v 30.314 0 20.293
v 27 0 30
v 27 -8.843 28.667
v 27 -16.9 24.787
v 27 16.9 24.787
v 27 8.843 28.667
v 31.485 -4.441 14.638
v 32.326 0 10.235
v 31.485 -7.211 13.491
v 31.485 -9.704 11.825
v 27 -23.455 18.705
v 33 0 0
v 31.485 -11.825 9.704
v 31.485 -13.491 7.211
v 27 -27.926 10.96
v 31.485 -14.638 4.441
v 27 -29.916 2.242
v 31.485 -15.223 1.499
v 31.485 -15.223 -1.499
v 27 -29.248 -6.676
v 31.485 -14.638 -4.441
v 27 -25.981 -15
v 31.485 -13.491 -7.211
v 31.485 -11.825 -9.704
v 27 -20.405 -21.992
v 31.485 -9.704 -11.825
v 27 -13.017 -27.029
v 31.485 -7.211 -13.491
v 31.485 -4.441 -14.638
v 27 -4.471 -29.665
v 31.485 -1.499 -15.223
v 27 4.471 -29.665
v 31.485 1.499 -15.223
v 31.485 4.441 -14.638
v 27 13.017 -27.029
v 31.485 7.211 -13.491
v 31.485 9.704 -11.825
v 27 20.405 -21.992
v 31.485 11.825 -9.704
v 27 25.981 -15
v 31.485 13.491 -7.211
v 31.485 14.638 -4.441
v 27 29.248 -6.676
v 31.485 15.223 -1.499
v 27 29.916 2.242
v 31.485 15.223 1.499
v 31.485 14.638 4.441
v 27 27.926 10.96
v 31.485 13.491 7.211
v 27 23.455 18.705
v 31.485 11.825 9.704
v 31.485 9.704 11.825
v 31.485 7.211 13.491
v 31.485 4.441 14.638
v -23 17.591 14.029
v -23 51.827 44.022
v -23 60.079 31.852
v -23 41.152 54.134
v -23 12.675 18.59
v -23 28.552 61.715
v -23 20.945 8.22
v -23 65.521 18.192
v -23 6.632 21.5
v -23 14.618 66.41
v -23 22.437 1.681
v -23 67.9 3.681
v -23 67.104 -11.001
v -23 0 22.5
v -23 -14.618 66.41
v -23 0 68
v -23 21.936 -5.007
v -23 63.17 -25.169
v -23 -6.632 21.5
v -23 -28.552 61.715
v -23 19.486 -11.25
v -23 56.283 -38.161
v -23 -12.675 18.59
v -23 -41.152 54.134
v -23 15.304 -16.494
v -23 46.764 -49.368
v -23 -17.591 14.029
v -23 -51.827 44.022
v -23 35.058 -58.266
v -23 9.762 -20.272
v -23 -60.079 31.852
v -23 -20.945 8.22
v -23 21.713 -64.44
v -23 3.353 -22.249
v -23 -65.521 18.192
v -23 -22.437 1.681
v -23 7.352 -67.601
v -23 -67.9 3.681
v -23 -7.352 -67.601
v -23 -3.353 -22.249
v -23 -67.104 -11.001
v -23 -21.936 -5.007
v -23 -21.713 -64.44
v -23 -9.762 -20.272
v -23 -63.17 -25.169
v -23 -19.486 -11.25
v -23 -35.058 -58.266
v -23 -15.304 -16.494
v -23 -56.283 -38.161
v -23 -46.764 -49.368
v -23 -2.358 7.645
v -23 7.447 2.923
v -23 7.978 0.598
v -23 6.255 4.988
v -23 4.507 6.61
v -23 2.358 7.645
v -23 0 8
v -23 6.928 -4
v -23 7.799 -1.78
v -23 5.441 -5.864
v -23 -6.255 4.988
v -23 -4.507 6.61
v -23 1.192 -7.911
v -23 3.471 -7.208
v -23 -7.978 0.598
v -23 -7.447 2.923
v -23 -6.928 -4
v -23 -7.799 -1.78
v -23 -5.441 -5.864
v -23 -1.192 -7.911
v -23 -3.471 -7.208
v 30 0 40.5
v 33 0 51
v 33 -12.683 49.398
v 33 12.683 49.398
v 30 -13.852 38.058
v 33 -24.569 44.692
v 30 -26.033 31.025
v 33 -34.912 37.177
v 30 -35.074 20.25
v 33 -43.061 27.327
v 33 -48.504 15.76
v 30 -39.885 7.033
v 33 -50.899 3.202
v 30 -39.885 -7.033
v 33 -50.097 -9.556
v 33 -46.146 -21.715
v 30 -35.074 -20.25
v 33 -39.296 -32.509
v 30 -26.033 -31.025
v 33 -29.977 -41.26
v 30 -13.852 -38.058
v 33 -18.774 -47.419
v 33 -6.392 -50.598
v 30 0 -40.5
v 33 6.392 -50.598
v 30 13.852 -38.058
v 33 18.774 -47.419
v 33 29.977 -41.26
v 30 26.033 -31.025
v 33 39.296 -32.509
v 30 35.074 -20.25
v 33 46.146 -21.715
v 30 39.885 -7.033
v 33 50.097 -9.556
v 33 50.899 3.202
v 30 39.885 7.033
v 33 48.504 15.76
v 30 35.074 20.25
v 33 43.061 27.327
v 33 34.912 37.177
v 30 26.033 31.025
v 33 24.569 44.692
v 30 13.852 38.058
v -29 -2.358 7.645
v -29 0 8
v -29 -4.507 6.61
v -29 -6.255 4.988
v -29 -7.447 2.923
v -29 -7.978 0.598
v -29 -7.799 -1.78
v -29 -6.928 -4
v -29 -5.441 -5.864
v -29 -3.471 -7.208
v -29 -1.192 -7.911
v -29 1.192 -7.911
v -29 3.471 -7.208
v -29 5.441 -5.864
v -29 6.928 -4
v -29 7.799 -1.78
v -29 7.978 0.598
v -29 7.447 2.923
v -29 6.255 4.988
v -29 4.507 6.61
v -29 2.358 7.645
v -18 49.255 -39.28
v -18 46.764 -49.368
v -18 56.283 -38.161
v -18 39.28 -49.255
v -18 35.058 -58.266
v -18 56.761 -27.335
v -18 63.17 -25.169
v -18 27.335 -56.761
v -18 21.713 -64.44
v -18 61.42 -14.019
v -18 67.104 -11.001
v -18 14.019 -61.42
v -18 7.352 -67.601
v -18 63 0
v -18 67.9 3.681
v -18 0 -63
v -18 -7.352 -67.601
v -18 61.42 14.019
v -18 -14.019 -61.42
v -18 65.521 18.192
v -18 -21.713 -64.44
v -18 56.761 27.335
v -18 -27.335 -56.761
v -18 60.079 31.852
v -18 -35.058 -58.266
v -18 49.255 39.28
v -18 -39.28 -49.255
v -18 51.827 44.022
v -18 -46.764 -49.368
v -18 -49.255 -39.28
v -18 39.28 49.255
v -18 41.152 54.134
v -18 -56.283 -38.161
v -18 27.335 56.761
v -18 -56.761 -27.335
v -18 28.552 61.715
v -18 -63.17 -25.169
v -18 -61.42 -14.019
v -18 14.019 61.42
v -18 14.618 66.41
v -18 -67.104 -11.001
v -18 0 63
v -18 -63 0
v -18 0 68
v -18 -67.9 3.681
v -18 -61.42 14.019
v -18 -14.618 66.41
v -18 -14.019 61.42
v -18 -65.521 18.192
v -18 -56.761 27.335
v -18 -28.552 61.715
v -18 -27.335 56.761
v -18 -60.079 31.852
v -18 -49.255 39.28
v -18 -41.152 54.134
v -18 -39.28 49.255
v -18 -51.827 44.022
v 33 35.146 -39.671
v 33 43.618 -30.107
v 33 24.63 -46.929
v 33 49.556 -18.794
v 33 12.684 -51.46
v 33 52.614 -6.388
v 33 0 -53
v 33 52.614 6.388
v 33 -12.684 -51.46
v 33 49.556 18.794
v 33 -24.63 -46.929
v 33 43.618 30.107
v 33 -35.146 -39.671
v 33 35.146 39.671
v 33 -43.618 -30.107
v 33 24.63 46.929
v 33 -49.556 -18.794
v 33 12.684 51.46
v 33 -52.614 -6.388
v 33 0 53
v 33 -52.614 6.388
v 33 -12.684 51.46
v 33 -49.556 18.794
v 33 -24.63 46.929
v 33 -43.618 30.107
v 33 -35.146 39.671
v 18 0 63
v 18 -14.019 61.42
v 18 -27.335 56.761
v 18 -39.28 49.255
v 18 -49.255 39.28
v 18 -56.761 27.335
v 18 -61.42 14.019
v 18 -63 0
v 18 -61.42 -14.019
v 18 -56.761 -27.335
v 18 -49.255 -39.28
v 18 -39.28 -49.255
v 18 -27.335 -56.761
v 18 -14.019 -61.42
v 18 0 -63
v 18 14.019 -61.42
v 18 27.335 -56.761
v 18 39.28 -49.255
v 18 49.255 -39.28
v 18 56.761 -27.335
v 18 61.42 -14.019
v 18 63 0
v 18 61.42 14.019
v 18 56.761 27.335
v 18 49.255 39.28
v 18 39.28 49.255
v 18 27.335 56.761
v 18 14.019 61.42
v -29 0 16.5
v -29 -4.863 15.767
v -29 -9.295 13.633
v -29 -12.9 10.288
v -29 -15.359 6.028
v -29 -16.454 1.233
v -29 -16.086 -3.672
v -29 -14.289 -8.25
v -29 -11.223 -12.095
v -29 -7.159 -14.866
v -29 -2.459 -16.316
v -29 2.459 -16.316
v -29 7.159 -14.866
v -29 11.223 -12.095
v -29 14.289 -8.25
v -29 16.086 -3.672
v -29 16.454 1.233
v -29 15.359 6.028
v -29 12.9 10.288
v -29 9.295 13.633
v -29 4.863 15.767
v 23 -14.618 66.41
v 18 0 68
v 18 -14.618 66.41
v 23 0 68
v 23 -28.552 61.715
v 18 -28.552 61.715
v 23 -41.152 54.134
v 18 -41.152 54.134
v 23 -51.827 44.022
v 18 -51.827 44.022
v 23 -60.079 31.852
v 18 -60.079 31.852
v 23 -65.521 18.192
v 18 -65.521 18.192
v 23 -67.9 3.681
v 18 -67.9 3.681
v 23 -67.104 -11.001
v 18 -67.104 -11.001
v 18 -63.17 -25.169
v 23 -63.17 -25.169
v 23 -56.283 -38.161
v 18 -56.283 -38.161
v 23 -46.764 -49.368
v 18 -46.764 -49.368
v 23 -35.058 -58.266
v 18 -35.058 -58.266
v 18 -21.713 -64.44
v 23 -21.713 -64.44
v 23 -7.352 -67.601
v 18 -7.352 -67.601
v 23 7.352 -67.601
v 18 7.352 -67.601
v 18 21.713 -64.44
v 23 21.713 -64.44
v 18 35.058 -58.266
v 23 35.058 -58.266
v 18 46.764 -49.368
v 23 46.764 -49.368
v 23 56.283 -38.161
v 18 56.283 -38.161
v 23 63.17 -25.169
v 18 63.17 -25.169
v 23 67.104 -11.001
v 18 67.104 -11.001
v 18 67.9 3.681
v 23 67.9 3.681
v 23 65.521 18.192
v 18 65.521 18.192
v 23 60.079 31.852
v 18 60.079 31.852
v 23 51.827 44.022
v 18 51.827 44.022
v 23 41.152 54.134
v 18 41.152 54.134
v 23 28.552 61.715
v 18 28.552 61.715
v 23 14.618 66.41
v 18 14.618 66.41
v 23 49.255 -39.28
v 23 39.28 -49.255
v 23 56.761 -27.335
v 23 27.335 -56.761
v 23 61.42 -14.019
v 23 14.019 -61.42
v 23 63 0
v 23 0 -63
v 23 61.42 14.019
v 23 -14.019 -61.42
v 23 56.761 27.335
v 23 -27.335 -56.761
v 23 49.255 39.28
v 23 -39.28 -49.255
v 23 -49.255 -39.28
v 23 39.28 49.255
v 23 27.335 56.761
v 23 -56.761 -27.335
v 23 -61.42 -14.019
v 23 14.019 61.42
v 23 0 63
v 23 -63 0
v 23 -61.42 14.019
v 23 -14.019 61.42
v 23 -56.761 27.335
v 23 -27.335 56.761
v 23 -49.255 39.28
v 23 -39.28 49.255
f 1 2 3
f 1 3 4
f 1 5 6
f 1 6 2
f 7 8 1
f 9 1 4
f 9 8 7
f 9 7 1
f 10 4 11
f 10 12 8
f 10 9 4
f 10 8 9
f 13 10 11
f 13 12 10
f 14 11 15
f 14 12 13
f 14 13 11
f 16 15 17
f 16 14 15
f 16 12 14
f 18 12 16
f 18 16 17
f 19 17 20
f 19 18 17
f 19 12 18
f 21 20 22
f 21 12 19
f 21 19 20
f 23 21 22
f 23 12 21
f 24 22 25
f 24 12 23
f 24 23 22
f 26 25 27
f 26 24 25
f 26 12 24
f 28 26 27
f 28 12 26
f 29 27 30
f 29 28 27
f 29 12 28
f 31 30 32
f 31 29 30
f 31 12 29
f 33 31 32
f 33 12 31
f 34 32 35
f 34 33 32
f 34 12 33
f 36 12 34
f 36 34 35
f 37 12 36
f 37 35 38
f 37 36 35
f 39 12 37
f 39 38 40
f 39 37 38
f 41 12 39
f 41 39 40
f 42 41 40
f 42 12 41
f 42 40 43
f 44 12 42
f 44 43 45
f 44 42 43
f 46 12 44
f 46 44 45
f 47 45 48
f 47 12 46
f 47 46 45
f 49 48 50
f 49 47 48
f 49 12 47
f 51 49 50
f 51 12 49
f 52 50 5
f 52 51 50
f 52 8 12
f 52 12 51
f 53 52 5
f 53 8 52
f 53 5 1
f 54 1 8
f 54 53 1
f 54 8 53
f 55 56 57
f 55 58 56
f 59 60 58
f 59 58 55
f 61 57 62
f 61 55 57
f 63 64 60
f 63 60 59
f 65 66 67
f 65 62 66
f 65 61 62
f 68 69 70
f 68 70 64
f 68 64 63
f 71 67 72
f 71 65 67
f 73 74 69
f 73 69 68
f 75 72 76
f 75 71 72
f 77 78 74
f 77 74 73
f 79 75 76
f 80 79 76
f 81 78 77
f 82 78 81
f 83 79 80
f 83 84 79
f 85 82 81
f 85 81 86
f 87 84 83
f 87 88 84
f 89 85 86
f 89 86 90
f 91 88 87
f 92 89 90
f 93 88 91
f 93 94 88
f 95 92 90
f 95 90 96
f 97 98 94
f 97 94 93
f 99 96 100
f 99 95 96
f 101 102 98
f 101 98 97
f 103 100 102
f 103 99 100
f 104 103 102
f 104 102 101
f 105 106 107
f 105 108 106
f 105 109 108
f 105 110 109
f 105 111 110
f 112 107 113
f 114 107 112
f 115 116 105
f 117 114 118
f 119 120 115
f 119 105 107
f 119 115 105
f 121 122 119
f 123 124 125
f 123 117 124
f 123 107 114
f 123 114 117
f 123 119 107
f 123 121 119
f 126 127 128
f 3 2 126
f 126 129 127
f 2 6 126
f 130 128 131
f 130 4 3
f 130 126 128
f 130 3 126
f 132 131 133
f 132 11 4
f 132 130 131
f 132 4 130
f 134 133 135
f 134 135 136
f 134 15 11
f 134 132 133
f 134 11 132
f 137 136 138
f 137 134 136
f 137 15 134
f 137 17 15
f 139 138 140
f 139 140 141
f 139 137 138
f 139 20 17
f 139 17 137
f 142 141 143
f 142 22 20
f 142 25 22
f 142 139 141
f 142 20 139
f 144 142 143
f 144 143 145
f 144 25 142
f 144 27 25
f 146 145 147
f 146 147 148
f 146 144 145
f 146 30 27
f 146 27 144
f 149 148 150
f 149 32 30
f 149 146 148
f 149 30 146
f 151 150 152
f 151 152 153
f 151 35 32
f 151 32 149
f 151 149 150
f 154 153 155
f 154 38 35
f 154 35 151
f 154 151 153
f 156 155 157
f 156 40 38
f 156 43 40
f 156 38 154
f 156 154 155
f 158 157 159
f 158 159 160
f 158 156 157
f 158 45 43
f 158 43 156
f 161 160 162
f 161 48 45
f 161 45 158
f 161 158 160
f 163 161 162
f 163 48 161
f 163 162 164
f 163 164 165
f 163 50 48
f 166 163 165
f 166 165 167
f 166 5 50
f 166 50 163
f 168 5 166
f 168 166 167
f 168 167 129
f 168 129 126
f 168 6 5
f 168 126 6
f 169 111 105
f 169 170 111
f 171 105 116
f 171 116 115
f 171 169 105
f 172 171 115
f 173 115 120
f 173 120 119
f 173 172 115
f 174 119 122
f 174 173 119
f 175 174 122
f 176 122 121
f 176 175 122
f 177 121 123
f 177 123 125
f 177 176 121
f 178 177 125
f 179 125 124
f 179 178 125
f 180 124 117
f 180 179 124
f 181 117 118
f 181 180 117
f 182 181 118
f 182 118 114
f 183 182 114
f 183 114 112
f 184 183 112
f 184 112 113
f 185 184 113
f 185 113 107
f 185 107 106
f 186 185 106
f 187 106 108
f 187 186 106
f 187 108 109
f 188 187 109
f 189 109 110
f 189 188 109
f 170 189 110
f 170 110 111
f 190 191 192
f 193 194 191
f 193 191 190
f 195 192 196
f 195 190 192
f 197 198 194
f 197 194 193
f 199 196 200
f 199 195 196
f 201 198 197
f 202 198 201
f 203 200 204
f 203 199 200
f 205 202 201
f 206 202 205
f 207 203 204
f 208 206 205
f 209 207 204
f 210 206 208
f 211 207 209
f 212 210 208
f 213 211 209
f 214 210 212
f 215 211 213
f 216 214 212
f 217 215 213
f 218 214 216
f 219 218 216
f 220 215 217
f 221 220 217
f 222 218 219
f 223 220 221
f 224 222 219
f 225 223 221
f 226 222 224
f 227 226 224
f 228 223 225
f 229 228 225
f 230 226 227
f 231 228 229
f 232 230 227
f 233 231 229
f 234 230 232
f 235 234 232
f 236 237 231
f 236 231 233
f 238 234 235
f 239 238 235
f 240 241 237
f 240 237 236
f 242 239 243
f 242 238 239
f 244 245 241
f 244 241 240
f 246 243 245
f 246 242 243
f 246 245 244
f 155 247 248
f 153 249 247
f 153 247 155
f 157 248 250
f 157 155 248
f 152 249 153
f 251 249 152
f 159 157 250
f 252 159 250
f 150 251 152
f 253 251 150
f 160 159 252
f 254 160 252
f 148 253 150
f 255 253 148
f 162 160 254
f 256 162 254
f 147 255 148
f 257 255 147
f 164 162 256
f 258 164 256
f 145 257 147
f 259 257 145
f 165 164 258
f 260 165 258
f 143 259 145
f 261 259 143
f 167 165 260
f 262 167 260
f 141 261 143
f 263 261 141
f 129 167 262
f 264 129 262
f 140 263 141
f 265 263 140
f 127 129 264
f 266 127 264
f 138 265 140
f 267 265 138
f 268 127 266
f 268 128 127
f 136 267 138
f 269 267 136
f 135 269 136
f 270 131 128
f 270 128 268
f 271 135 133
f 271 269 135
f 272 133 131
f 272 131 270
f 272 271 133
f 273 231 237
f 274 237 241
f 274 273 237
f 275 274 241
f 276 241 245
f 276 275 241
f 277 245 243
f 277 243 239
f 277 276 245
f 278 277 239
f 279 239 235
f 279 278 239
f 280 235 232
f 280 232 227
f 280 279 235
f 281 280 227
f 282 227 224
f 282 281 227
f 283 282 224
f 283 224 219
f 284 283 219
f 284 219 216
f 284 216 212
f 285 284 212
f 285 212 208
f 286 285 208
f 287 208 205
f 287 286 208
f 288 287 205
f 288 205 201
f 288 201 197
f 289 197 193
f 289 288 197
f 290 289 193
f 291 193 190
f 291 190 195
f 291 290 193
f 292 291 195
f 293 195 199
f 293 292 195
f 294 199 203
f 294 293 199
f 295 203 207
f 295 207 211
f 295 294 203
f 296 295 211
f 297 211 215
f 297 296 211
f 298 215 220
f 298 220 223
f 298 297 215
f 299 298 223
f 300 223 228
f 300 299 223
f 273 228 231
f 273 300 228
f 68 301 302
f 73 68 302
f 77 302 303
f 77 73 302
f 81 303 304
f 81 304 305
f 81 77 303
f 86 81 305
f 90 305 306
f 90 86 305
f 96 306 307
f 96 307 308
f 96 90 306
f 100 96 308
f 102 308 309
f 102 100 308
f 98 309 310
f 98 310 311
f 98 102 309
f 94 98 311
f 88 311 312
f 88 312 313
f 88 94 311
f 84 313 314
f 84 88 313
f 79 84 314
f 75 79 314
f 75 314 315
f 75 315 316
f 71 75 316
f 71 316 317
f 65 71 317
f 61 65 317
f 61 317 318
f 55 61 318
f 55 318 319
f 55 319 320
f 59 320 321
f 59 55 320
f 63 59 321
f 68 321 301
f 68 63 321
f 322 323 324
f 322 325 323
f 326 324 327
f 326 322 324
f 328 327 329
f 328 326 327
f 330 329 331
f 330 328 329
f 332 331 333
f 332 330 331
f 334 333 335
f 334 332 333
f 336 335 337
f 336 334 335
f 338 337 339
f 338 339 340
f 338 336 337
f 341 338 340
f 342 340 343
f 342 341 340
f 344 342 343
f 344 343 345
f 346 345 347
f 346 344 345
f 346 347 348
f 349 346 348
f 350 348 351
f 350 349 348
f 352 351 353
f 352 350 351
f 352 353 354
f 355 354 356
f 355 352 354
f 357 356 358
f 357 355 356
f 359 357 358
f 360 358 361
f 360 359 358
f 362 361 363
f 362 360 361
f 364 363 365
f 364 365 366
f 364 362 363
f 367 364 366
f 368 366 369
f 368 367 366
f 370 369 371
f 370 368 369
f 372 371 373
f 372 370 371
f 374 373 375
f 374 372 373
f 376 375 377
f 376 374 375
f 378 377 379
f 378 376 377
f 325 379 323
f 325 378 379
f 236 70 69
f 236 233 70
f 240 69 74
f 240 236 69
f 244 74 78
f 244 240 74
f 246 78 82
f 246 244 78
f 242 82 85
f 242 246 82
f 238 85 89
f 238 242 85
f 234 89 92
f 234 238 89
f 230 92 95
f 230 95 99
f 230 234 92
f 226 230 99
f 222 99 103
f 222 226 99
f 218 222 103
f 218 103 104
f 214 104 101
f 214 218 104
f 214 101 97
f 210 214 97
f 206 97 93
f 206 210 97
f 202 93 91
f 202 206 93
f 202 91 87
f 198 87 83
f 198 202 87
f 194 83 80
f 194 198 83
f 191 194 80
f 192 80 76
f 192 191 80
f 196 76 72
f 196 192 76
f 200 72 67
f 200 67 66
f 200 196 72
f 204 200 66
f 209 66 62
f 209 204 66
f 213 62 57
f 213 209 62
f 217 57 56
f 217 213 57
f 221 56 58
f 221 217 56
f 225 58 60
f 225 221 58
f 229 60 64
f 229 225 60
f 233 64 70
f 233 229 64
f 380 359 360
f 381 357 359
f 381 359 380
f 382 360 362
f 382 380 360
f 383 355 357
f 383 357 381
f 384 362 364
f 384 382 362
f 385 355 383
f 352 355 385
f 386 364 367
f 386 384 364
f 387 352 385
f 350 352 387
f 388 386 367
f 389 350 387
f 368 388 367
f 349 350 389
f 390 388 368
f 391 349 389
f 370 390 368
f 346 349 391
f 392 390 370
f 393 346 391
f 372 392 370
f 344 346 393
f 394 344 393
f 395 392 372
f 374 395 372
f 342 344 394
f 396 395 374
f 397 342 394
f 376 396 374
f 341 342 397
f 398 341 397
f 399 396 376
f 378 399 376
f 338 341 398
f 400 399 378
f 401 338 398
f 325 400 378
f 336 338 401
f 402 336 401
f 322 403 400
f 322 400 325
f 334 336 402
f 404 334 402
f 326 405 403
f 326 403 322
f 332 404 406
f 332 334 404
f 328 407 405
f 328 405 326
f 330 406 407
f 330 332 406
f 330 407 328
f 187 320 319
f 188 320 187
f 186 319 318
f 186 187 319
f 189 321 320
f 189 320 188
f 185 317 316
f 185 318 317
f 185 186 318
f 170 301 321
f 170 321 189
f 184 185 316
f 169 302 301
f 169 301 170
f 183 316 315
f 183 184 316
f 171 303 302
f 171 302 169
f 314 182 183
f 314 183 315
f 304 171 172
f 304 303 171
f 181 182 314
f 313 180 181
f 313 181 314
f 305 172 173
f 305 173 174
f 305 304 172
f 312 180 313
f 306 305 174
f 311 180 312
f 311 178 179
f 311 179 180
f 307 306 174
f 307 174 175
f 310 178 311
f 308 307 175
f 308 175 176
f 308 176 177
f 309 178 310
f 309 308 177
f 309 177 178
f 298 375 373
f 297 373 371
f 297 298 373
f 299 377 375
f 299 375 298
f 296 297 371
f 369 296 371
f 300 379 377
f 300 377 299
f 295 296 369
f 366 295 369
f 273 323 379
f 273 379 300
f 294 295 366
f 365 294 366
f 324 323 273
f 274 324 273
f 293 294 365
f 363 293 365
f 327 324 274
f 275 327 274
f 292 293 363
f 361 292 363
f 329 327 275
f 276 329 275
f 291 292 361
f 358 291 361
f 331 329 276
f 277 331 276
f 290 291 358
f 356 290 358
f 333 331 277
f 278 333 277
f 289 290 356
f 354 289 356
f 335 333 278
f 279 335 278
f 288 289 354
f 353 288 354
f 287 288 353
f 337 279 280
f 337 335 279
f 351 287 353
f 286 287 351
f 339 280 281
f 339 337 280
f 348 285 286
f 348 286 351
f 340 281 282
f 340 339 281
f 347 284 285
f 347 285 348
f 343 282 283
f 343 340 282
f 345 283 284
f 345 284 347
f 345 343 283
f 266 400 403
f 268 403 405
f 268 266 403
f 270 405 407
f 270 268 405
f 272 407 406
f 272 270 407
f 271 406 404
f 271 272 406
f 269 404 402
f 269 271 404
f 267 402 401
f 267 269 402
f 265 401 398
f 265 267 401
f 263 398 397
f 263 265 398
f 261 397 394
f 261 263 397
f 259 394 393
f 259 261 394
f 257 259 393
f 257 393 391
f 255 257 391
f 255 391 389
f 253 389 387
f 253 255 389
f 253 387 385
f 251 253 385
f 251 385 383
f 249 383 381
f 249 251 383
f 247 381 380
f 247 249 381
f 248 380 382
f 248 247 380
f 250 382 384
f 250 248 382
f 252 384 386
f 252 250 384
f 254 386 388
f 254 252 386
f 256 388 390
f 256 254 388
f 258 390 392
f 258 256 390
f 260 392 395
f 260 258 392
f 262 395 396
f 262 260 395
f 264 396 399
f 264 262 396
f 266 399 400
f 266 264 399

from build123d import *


with BuildPart() as part:
    # Croquis1 → Revolución1 (revolve)
    with BuildSketch(Plane.XY, mode=Mode.PRIVATE) as revoluci_n1_sk:
        with BuildLine():
            Line((-23, 68), (-18, 68))
            Line((-18, 68), (-18, 63))
            Line((-18, 63), (18, 63))
            Line((18, 63), (18, 68))
            Line((18, 68), (23, 68))
            Line((23, 68), (23, 63))
            Line((23, 63), (33, 53))
            Line((33, 53), (33, 51))
            Line((33, 51), (27, 30))
            ThreePointArc((27, 30), (31.485292704, 15.297058541), (33, 0))
            Line((33, 0), (-23, 0))
            Line((-23, 0), (-23, 8))
            Line((-23, 8), (-29, 8))
            Line((-29, 8), (-29, 16.5))
            Line((-29, 16.5), (-23, 22.5))
            Line((-23, 22.5), (-23, 68))
        make_face()
    revolve(revoluci_n1_sk.sketch.rotate(Axis((-754.889867841, 0, 0), (1, 0, 0)), 90), axis=Axis((-754.889867841, 0, 0), (1, 0, 0)))


solid = part.part
